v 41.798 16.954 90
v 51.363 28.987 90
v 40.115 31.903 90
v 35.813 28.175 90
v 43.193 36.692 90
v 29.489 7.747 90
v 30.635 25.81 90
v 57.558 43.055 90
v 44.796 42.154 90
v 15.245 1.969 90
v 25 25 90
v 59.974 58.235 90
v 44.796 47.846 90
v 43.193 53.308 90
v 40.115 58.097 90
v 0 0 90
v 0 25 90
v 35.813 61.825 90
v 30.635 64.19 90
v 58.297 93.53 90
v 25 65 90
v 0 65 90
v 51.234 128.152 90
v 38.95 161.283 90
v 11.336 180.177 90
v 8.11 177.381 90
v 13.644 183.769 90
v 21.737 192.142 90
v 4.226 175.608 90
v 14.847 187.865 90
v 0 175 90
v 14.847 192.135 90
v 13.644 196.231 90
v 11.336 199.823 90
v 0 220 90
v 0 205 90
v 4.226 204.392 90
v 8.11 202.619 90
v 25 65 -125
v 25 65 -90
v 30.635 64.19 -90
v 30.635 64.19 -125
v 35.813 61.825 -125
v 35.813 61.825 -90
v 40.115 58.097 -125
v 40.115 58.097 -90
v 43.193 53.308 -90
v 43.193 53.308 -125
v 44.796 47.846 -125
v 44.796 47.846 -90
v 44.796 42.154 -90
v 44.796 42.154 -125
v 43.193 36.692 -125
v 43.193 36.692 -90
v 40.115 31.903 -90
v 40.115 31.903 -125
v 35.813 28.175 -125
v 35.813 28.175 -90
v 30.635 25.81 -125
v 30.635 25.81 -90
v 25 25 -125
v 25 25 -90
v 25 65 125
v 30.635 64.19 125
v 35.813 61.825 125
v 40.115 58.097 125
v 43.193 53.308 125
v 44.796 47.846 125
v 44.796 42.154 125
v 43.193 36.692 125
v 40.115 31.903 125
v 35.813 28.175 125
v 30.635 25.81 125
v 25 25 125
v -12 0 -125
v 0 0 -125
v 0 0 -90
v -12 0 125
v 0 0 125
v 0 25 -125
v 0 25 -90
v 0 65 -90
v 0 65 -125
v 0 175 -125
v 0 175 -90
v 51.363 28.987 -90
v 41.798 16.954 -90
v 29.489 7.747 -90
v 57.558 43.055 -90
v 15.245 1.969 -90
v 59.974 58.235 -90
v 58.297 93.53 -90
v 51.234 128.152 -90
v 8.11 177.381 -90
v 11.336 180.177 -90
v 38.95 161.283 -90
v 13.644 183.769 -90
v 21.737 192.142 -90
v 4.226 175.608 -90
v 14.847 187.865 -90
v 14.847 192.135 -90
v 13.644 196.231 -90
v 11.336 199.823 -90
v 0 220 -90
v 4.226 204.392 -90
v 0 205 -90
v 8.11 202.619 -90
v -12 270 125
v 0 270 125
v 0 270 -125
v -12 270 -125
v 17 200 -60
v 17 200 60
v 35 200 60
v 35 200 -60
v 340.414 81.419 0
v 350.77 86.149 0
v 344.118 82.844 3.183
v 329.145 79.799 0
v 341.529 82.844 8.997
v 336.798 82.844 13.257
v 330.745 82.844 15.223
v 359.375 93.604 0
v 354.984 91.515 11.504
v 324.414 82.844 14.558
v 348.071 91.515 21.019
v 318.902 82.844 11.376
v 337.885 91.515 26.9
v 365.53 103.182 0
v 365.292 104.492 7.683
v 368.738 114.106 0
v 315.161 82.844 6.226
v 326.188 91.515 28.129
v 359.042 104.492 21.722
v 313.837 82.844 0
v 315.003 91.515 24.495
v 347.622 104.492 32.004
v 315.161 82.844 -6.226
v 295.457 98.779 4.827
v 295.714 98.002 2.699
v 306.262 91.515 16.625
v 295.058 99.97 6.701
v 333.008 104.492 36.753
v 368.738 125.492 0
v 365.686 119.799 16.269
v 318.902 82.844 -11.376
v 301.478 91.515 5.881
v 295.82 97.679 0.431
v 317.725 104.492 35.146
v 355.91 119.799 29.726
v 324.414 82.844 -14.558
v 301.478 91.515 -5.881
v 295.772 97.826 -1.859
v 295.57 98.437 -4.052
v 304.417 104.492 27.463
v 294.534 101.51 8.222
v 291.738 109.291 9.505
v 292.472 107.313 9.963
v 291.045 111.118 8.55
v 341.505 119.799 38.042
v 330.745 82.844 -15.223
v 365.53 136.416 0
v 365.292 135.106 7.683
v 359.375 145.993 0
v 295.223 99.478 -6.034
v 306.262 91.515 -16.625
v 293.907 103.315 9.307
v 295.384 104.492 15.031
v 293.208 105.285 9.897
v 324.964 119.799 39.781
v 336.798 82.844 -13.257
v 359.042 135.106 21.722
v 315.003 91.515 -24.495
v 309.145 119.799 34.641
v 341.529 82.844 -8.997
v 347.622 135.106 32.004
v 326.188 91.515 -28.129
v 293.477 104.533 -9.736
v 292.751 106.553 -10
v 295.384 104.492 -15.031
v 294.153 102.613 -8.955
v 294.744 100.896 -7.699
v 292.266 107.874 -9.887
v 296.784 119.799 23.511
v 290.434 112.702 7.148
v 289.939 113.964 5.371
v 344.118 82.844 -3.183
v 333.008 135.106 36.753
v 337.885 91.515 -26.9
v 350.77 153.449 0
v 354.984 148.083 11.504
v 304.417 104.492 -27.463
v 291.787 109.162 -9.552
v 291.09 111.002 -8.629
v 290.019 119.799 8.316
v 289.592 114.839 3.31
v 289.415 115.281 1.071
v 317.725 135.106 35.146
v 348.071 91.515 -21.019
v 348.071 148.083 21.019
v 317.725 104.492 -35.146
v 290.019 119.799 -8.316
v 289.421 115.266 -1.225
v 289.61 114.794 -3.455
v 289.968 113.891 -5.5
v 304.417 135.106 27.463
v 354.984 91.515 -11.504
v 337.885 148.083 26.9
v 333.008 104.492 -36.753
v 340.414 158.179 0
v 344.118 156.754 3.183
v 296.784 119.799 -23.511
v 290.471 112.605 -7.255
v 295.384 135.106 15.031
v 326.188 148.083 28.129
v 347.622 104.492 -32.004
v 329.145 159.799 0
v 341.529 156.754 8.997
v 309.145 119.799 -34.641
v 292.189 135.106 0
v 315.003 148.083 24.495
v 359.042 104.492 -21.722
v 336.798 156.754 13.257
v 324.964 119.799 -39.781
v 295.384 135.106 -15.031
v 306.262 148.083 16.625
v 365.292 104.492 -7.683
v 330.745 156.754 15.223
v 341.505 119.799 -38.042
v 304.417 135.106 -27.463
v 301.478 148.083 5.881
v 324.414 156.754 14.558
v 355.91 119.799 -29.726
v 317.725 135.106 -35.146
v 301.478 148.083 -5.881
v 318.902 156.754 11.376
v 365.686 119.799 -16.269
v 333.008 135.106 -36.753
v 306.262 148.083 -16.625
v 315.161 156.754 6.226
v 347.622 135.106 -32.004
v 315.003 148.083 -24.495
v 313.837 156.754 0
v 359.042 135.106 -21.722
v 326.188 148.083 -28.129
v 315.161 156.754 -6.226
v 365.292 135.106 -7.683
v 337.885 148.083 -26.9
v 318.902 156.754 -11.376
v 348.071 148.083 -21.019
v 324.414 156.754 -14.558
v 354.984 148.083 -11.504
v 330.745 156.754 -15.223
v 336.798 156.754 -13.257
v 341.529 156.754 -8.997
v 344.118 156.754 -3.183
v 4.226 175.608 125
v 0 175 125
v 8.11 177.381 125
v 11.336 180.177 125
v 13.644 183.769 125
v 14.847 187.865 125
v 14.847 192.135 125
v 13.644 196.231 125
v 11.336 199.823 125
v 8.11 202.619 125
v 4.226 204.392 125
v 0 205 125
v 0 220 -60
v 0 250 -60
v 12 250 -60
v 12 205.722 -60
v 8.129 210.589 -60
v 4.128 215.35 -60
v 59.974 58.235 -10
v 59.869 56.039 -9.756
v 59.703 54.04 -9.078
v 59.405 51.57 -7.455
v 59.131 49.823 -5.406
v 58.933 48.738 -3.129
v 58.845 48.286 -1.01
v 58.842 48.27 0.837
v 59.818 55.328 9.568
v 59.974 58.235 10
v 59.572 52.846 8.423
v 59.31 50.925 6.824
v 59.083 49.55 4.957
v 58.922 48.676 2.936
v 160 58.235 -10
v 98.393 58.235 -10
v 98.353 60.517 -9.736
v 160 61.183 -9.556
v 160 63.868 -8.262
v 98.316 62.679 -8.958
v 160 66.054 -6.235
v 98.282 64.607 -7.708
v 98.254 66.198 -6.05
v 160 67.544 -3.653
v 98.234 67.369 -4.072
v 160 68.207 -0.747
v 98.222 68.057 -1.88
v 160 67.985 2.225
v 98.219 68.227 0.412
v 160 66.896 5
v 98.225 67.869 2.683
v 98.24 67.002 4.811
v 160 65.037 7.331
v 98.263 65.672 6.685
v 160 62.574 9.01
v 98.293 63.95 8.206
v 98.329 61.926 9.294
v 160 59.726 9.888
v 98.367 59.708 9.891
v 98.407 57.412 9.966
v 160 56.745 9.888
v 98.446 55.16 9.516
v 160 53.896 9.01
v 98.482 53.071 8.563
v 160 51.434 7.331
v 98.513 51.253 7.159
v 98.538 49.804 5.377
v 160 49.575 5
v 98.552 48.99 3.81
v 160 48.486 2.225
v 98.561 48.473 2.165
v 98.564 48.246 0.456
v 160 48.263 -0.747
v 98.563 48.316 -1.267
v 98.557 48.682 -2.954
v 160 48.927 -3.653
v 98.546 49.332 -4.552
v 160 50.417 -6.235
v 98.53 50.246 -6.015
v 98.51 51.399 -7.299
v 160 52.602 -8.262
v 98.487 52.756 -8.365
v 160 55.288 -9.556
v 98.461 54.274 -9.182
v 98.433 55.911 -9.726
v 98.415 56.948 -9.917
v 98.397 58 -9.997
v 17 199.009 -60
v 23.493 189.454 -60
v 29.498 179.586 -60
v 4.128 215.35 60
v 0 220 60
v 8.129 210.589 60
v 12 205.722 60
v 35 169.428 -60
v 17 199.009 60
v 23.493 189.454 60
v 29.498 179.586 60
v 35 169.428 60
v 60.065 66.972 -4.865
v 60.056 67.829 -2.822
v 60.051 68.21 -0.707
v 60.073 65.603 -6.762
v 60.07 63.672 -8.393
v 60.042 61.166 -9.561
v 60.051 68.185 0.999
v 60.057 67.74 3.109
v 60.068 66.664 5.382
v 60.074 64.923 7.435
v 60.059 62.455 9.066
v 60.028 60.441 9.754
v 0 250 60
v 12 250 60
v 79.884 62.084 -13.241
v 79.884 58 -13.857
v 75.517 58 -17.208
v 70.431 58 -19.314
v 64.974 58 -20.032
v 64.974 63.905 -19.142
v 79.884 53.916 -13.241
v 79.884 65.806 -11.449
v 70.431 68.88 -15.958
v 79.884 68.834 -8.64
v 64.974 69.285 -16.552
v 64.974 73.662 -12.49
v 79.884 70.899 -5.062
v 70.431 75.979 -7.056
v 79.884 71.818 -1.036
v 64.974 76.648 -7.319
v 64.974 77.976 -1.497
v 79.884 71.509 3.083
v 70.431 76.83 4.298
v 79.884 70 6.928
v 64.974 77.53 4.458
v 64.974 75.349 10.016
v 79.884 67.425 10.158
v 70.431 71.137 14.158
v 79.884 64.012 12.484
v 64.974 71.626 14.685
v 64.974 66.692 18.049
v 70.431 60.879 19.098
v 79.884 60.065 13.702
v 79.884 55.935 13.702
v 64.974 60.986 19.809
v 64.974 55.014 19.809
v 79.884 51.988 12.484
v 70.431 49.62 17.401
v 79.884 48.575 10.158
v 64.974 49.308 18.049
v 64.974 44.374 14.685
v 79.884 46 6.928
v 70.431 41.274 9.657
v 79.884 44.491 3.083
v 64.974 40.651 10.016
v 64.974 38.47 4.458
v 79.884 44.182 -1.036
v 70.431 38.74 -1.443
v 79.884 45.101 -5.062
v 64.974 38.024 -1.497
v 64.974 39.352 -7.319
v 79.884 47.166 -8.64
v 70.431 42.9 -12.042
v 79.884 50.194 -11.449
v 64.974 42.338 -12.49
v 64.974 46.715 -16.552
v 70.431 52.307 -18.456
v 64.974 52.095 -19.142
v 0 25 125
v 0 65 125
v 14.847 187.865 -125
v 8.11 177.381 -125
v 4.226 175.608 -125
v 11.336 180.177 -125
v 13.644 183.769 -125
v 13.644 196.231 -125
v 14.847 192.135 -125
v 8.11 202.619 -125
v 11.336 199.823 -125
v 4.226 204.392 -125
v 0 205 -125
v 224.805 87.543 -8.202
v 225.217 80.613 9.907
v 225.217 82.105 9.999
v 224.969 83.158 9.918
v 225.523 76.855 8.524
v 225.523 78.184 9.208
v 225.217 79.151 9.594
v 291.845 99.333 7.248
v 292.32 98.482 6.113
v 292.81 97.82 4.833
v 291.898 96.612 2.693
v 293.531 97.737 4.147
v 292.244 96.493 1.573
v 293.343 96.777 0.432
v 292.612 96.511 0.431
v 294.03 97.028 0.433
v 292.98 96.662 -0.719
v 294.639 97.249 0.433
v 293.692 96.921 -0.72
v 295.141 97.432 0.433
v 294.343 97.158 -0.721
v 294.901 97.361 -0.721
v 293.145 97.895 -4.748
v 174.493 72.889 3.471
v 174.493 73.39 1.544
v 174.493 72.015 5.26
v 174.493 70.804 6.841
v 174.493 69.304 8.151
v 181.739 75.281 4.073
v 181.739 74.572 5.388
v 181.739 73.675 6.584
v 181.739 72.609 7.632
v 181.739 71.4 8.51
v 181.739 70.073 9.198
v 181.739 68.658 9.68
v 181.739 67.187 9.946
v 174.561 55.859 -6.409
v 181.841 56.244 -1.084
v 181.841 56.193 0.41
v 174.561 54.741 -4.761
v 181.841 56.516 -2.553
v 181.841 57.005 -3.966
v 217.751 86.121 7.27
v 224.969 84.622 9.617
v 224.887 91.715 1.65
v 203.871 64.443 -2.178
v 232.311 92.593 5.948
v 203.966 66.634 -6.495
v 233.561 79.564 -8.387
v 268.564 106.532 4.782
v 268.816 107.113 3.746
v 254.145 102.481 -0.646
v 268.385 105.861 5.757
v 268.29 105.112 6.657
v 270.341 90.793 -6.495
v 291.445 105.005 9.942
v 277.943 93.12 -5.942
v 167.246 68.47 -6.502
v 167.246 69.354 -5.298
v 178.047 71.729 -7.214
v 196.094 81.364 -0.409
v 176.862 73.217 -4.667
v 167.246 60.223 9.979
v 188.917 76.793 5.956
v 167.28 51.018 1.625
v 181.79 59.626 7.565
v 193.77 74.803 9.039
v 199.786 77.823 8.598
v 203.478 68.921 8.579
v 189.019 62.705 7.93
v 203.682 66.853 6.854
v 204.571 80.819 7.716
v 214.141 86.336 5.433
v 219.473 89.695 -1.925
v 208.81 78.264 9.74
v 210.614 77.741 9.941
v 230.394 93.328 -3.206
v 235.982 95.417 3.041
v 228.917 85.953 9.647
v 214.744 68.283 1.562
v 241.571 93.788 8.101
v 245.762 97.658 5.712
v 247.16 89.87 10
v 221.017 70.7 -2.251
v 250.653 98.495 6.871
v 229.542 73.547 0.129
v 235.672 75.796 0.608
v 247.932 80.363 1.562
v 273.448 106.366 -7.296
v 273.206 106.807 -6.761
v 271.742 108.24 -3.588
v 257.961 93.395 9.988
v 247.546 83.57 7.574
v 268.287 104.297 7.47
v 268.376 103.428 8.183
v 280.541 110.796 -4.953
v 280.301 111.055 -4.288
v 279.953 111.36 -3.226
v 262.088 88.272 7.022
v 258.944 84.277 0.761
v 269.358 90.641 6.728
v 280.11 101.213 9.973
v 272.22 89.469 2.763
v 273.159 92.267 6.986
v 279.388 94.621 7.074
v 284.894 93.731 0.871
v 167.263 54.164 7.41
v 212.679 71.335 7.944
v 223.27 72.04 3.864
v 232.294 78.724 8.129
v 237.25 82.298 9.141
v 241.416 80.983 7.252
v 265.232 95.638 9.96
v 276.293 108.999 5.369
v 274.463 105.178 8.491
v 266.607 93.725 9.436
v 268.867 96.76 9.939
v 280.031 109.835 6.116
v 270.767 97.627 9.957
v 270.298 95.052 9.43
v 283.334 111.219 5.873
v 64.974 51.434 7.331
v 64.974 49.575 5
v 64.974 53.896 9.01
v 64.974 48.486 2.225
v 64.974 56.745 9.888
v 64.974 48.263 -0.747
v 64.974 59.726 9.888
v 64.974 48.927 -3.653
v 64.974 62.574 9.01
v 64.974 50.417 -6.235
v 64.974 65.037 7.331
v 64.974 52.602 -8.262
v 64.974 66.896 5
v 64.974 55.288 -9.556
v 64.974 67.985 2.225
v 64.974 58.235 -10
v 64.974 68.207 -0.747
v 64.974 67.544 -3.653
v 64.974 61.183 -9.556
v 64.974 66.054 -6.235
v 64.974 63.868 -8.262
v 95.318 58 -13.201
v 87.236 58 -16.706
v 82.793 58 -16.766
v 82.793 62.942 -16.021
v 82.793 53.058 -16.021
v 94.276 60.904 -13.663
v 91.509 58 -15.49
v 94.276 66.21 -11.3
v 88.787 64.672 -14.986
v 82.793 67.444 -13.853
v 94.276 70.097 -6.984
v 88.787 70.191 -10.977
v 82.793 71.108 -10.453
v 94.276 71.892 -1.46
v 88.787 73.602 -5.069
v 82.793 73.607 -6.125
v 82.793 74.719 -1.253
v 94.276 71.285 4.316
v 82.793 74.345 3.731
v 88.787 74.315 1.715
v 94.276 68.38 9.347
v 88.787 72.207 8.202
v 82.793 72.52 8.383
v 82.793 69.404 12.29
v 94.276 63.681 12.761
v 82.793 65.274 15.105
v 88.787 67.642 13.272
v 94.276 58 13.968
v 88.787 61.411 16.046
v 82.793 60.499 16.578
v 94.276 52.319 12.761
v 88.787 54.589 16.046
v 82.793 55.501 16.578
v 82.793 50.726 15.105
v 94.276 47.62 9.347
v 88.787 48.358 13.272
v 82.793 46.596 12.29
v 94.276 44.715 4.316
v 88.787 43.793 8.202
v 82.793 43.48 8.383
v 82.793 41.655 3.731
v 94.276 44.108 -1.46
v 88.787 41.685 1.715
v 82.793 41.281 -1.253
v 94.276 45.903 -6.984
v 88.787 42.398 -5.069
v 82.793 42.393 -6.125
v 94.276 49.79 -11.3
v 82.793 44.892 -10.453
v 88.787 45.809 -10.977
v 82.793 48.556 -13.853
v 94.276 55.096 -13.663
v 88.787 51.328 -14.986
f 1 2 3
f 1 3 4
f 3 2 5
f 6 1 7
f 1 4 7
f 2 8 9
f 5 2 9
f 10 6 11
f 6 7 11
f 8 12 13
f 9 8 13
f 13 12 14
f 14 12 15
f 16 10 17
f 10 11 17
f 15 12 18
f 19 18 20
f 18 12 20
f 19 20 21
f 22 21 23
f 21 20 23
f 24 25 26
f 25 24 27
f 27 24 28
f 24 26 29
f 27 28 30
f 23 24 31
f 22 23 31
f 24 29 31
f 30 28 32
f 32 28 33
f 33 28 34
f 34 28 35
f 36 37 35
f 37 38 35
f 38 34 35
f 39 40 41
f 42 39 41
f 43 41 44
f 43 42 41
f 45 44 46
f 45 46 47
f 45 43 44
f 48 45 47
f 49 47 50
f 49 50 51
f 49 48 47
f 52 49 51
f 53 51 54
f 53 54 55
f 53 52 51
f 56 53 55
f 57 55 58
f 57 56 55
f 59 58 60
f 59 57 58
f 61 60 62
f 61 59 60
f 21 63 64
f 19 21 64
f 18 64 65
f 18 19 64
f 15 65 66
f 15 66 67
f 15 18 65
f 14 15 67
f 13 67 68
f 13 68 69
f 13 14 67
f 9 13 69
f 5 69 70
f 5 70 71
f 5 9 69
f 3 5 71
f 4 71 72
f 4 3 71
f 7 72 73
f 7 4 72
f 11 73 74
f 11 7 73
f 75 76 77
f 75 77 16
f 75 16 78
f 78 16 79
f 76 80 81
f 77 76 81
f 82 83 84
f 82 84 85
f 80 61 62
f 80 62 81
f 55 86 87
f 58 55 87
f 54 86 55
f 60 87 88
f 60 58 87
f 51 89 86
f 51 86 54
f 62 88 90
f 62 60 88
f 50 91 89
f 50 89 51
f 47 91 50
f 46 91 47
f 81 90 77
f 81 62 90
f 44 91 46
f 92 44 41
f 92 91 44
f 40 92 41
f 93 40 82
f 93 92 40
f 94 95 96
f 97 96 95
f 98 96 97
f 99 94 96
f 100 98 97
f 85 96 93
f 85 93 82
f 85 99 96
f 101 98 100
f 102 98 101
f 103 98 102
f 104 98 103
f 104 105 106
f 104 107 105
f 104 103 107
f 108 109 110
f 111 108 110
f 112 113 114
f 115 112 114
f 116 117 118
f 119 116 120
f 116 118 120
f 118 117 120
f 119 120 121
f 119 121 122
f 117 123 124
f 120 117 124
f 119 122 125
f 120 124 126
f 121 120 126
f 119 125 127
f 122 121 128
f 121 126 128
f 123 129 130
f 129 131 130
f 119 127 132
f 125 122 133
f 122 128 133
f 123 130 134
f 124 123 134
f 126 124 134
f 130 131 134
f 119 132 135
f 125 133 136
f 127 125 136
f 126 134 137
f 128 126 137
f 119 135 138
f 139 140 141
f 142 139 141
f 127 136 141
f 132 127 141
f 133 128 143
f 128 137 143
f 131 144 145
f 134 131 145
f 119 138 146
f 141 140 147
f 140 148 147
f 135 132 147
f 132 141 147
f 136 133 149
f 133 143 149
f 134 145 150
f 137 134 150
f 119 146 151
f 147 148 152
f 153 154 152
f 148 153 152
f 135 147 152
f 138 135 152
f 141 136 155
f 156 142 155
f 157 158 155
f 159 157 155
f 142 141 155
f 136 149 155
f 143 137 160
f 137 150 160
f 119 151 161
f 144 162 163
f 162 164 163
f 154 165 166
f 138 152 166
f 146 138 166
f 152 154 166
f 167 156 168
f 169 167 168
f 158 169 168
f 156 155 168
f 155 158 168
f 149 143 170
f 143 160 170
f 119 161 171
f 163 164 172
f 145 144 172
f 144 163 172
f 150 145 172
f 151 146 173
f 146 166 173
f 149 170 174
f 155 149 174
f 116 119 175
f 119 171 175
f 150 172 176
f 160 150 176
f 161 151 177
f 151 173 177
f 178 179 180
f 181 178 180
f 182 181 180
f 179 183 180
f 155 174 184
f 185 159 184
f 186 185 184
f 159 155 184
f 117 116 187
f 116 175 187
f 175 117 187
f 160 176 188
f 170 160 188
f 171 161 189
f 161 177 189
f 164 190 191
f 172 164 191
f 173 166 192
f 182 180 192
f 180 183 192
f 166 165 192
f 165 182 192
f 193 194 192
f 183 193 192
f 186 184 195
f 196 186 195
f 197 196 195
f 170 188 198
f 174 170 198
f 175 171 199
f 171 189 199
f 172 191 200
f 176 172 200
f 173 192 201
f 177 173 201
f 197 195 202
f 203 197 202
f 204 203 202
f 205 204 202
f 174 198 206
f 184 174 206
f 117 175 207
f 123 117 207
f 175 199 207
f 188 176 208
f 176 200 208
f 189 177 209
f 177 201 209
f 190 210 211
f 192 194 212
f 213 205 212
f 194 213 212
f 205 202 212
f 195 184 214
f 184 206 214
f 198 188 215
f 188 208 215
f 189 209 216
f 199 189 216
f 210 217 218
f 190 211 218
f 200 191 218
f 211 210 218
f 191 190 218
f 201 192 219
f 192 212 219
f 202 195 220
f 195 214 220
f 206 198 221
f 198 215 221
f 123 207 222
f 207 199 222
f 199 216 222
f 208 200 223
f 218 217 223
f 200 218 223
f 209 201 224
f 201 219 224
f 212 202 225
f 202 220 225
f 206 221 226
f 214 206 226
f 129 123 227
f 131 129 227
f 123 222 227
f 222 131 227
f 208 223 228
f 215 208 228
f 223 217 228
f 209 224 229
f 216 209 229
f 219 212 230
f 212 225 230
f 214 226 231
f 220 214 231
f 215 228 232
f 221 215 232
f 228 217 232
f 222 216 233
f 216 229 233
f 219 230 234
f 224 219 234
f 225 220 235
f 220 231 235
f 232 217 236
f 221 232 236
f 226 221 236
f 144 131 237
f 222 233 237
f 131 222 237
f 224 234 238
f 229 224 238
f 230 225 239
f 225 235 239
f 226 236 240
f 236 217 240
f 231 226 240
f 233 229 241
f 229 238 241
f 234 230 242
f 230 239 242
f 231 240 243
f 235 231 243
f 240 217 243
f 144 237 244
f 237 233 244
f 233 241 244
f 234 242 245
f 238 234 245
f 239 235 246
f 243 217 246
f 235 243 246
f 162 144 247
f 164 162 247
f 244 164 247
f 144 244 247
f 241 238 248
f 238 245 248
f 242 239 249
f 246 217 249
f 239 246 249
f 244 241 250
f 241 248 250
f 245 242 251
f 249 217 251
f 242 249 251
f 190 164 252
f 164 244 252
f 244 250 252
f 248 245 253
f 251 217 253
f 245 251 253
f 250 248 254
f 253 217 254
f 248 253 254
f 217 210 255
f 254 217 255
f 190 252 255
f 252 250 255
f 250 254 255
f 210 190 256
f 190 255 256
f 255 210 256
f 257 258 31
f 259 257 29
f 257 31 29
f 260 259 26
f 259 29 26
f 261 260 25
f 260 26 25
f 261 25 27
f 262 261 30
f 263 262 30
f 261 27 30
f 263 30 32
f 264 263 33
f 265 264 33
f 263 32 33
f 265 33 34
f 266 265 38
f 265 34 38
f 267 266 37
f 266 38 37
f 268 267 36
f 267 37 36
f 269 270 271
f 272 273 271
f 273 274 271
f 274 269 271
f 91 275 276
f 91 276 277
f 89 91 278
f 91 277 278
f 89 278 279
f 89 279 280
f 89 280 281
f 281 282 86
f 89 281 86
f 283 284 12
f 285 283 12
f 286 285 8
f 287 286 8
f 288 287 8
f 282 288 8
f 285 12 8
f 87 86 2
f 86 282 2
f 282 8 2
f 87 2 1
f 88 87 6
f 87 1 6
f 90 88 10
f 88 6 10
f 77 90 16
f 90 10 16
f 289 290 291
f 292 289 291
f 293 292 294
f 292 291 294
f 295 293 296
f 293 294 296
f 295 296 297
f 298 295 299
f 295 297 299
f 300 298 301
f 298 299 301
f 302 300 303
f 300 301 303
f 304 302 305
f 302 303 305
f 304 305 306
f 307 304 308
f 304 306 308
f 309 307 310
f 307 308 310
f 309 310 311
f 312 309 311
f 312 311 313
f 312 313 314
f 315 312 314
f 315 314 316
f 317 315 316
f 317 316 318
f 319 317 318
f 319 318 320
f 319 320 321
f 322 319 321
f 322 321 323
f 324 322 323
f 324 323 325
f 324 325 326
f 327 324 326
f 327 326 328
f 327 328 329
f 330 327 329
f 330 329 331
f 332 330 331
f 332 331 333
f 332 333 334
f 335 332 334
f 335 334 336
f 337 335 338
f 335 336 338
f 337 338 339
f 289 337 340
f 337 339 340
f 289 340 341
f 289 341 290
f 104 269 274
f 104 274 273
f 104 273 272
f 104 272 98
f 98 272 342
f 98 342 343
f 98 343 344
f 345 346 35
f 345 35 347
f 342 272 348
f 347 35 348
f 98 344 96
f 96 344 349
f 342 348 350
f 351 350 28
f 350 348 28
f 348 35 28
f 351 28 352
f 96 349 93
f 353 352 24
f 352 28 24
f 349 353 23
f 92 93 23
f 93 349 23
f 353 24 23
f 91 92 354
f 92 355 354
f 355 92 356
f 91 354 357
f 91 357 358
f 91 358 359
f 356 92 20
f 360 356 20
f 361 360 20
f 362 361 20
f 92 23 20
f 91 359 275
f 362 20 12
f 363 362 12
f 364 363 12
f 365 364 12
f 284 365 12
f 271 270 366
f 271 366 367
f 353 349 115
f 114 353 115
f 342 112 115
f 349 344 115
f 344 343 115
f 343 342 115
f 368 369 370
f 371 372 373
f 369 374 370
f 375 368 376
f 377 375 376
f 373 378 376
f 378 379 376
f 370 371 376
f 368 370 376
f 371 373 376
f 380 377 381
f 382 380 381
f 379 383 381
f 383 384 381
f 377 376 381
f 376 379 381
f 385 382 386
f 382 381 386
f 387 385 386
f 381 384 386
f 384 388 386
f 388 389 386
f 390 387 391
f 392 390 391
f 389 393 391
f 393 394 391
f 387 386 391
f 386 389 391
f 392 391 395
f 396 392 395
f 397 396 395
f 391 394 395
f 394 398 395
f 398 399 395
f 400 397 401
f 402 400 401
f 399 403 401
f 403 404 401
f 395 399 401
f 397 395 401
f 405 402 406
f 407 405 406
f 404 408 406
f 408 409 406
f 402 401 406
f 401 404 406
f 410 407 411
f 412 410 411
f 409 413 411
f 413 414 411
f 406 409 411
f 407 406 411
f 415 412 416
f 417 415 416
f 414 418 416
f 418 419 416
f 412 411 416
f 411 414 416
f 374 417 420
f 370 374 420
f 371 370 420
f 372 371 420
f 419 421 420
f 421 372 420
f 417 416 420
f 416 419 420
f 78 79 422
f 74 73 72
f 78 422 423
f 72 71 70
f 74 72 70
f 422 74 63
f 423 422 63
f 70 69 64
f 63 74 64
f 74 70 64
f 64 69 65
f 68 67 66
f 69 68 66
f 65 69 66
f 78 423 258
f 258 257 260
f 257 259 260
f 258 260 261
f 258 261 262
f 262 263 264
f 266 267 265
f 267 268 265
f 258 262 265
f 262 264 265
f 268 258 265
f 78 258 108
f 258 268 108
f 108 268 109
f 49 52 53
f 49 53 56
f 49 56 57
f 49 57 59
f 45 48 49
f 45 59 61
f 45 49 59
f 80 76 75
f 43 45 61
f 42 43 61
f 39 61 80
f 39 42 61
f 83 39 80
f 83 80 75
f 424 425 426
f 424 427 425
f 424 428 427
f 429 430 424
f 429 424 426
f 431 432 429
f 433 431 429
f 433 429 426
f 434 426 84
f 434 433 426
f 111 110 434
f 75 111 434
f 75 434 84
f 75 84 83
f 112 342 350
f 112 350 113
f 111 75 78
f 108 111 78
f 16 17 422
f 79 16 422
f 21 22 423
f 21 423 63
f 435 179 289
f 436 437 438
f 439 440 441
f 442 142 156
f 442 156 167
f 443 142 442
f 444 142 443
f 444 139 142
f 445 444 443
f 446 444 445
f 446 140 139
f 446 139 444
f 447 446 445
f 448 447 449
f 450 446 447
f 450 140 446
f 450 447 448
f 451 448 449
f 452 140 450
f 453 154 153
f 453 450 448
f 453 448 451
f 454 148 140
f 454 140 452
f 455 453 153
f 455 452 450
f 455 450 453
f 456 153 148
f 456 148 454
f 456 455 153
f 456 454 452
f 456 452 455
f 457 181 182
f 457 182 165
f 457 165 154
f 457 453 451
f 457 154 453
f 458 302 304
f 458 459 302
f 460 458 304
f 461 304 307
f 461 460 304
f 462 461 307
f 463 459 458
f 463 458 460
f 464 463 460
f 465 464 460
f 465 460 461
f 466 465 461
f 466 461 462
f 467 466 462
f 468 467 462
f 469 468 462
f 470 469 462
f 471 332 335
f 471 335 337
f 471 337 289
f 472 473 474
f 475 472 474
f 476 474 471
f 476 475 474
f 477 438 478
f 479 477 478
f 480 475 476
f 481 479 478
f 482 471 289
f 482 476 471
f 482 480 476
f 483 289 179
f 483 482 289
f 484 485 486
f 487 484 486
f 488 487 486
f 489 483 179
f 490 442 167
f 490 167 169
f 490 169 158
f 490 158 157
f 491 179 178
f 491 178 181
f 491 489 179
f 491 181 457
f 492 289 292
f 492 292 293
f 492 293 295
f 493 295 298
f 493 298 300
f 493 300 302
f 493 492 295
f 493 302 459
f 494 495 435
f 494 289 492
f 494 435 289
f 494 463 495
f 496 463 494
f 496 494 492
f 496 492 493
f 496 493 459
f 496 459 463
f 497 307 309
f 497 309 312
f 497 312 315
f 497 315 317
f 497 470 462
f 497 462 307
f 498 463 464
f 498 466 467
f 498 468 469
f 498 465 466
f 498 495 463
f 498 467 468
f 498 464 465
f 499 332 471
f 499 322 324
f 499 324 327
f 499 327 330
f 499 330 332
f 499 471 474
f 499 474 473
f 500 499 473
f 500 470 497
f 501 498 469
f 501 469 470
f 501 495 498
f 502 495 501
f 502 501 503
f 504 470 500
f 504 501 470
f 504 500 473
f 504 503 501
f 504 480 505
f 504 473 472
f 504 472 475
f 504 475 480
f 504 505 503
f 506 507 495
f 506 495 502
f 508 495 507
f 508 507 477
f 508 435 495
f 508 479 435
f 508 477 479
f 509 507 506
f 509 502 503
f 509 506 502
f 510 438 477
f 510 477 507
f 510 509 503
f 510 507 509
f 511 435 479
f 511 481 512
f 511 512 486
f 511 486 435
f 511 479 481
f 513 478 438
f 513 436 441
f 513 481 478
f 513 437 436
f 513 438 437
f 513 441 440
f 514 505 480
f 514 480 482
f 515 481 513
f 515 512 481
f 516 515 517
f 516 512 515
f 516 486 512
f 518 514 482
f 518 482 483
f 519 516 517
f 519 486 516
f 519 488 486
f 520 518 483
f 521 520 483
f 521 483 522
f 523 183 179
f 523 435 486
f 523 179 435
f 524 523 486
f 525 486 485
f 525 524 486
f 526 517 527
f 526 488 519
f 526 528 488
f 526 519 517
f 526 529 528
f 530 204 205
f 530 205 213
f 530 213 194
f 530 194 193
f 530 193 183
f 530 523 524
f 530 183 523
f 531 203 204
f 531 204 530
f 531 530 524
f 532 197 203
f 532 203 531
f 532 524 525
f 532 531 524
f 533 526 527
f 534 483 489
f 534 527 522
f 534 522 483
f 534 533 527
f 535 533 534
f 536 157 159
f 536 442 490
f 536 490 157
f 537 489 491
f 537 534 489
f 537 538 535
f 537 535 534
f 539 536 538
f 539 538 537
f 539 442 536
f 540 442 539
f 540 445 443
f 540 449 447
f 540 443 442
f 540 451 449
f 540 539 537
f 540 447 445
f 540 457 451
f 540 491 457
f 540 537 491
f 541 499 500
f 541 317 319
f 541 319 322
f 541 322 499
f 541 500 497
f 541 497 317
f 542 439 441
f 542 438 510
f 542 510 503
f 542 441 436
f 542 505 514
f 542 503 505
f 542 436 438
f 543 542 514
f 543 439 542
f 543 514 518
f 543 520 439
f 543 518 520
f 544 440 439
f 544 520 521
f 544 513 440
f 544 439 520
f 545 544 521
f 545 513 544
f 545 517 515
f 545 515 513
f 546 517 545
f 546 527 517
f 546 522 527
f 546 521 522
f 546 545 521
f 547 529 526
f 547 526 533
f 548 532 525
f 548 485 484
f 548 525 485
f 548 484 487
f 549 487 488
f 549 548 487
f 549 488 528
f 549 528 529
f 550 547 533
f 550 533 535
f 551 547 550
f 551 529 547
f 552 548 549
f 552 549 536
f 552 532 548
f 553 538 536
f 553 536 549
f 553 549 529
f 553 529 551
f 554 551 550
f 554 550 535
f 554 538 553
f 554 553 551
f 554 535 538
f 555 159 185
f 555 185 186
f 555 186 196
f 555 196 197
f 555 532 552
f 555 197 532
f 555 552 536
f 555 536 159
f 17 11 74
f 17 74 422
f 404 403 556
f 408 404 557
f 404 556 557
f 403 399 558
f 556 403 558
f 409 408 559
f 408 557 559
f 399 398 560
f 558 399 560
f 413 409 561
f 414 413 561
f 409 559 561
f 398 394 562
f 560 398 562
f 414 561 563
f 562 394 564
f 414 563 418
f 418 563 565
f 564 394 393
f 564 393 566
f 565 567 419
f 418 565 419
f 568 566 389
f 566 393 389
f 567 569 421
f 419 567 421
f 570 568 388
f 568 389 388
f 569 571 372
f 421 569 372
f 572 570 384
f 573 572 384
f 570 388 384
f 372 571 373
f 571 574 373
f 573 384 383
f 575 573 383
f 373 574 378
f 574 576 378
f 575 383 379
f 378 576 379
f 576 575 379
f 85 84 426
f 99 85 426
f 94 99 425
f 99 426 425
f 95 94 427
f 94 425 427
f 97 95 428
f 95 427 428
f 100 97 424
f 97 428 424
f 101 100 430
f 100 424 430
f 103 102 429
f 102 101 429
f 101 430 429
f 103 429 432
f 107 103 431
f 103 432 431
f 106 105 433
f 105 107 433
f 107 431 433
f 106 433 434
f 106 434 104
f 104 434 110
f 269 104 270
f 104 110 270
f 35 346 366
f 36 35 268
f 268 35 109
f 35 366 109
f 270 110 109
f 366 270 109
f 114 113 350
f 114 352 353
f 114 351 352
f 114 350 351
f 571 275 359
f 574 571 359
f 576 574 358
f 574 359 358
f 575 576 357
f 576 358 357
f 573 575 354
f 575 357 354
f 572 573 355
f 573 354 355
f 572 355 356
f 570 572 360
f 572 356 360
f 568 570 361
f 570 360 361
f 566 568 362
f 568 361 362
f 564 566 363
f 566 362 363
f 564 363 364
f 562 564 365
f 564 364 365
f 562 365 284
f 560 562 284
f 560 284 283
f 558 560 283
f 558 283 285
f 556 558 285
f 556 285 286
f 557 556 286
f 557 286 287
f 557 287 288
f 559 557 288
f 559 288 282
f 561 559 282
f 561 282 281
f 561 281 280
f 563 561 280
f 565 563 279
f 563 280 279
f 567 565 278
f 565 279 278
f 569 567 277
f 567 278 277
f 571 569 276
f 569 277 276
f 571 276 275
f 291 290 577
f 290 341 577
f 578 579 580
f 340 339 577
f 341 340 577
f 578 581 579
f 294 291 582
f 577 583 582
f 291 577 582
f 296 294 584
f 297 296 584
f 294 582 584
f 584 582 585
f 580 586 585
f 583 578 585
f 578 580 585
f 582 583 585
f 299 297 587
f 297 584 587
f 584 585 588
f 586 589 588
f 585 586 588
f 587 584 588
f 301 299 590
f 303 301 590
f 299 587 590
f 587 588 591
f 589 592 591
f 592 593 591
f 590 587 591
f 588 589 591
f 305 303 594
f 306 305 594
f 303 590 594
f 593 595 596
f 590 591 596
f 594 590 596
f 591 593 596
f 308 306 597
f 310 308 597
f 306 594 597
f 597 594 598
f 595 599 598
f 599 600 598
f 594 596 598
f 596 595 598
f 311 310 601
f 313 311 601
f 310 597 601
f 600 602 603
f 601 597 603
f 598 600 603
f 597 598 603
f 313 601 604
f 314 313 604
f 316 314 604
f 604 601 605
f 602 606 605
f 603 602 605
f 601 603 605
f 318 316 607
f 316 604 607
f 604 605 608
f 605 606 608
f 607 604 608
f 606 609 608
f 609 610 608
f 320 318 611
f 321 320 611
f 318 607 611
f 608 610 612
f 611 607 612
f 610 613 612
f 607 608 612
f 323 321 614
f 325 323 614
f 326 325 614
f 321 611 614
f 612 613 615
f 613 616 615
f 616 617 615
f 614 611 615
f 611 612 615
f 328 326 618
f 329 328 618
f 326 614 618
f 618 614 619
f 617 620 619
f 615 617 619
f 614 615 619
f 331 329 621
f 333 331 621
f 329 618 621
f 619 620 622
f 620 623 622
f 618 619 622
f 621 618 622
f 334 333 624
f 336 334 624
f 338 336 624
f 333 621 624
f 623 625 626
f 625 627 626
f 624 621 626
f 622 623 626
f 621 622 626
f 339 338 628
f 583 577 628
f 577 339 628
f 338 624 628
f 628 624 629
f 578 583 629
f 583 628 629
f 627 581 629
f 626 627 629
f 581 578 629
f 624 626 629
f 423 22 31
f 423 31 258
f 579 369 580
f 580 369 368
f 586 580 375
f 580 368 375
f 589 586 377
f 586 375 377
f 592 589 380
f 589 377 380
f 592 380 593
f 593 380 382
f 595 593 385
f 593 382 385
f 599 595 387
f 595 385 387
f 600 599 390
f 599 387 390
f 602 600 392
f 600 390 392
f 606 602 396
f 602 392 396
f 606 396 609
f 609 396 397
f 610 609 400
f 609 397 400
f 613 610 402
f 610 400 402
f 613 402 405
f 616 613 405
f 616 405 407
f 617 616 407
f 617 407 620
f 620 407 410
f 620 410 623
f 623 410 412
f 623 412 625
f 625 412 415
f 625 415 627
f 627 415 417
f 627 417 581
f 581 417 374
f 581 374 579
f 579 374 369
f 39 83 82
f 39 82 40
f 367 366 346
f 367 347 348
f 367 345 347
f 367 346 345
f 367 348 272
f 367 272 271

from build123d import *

# Parameters (mm, degrees)
BOSS_EXTRUDE2_DEPTH = 90
BOSS_EXTRUDE3_DEPTH = 12
SKETCH3_W           = 18
SKETCH3_H           = 76.981608939
SKETCH3_W_2         = 12
SKETCH3_H_2         = 76.255384777
BOSS_EXTRUDE4_DEPTH = 60
BOSS_EXTRUDE5_START = -250
BOSS_EXTRUDE5_DEPTH = 250
SKETCH5_R           = 10
BOSS_EXTRUDE6_DEPTH = 160
SKETCH8_R           = 10


with BuildPart() as part:
    # Sketch1 → Boss-Extrude2 (new, symmetric)
    with BuildSketch(Plane.XY):
        with BuildLine():
            Line((0, 0), (0, 220))
            ThreePointArc((0, 220), (45.729180399, 144.95403091), (59.974042828, 58.235294118))
            ThreePointArc((59.974042828, 58.235294118), (41.797832761, 16.954196761), (0, 0))
        make_face()
    extrude(amount=BOSS_EXTRUDE2_DEPTH, both=True)

    # Sketch2 → Boss-Extrude3 (add)
    with BuildSketch(Plane.ZY):
        Polygon((0, 0), (125, 0), (125, 270), (-125, 270), (-125, 0), align=None)
    extrude(amount=BOSS_EXTRUDE3_DEPTH)

    # Sketch3 → Boss-Extrude4 (add, symmetric)
    with BuildSketch(Plane.XY):
        with Locations((26, 161.50919553)):
            Rectangle(SKETCH3_W, SKETCH3_H)
        with Locations((6, 211.872307612)):
            Rectangle(SKETCH3_W_2, SKETCH3_H_2)
    extrude(amount=BOSS_EXTRUDE4_DEPTH, both=True)

    # Sketch4 → Boss-Extrude5 (add)
    with BuildSketch(Plane.XY.offset(125).offset(BOSS_EXTRUDE5_START)):
        with BuildLine():
            Line((0, 65), (25, 65))
            ThreePointArc((25, 65), (45, 45), (25, 25))
            Line((25, 25), (0, 25))
            Line((0, 25), (0, 65))
        make_face()
        with BuildLine():
            Line((0, 205), (0, 175))
            ThreePointArc((0, 175), (15, 190), (0, 205))
        make_face()
    extrude(amount=BOSS_EXTRUDE5_DEPTH)

    # Sketch5 → Boss-Extrude6 (add)
    with BuildSketch(Plane(origin=(0, 0, 0), x_dir=(0, 0, -1), z_dir=(1, 0, 0))):
        with Locations((0, 58.235294118)):
            Circle(SKETCH5_R)
    extrude(amount=BOSS_EXTRUDE6_DEPTH)

    # Sketch6 → Revolve2 (revolve)
    with BuildSketch(Plane(origin=(0, 58, 0), x_dir=(1, 0, 0), z_dir=(0, 1, 0))):
        with BuildLine():
            Line((81.674631605, 0), (101.674631605, 0))
            ThreePointArc((101.674631605, 0), (96.000878794, 12.625507314), (82.792800006, 16.765744099))
            Line((82.792800006, 16.765744099), (79.883742711, 13.856686803))
            ThreePointArc((79.883742711, 13.856686803), (73.043114259, 18.427448605), (64.974042828, 20.032486705))
            Line((64.974042828, 20.032486705), (64.974042828, 0))
            Line((64.974042828, 0), (81.674631605, 0))
        make_face()
    revolve(axis=Axis((64.974042828, 58, 0), (1, 0, 0)))

    # Sweep1: sweep along a path in Sketch7
    with BuildLine(Plane.XY) as sweep1_path:
        Line((160, 58.235294118), (329.144671741, 119.798919916))
    # Sketch8 → Sweep1 (sweep)
    with BuildSketch(Plane(origin=(160, 0, 0), x_dir=(0, 0, -1), z_dir=(1, 0, 0))):
        with Locations((0, 58.235294118)):
            Circle(SKETCH8_R)
    sweep(path=sweep1_path.line)

    # Sketch9 → Revolve3 (revolve)
    with BuildSketch(Plane.XY):
        with BuildLine():
            Line((329.144671741, 119.798919916), (329.144671741, 79.798919916))
            ThreePointArc((329.144671741, 79.798919916), (369.144671741, 119.798919916), (329.144671741, 159.798919916))
            Line((329.144671741, 159.798919916), (329.144671741, 119.798919916))
        make_face()
    revolve(axis=Axis((329.144671741, 119.798919916, 0), (0, -1, 0)))


solid = part.part
